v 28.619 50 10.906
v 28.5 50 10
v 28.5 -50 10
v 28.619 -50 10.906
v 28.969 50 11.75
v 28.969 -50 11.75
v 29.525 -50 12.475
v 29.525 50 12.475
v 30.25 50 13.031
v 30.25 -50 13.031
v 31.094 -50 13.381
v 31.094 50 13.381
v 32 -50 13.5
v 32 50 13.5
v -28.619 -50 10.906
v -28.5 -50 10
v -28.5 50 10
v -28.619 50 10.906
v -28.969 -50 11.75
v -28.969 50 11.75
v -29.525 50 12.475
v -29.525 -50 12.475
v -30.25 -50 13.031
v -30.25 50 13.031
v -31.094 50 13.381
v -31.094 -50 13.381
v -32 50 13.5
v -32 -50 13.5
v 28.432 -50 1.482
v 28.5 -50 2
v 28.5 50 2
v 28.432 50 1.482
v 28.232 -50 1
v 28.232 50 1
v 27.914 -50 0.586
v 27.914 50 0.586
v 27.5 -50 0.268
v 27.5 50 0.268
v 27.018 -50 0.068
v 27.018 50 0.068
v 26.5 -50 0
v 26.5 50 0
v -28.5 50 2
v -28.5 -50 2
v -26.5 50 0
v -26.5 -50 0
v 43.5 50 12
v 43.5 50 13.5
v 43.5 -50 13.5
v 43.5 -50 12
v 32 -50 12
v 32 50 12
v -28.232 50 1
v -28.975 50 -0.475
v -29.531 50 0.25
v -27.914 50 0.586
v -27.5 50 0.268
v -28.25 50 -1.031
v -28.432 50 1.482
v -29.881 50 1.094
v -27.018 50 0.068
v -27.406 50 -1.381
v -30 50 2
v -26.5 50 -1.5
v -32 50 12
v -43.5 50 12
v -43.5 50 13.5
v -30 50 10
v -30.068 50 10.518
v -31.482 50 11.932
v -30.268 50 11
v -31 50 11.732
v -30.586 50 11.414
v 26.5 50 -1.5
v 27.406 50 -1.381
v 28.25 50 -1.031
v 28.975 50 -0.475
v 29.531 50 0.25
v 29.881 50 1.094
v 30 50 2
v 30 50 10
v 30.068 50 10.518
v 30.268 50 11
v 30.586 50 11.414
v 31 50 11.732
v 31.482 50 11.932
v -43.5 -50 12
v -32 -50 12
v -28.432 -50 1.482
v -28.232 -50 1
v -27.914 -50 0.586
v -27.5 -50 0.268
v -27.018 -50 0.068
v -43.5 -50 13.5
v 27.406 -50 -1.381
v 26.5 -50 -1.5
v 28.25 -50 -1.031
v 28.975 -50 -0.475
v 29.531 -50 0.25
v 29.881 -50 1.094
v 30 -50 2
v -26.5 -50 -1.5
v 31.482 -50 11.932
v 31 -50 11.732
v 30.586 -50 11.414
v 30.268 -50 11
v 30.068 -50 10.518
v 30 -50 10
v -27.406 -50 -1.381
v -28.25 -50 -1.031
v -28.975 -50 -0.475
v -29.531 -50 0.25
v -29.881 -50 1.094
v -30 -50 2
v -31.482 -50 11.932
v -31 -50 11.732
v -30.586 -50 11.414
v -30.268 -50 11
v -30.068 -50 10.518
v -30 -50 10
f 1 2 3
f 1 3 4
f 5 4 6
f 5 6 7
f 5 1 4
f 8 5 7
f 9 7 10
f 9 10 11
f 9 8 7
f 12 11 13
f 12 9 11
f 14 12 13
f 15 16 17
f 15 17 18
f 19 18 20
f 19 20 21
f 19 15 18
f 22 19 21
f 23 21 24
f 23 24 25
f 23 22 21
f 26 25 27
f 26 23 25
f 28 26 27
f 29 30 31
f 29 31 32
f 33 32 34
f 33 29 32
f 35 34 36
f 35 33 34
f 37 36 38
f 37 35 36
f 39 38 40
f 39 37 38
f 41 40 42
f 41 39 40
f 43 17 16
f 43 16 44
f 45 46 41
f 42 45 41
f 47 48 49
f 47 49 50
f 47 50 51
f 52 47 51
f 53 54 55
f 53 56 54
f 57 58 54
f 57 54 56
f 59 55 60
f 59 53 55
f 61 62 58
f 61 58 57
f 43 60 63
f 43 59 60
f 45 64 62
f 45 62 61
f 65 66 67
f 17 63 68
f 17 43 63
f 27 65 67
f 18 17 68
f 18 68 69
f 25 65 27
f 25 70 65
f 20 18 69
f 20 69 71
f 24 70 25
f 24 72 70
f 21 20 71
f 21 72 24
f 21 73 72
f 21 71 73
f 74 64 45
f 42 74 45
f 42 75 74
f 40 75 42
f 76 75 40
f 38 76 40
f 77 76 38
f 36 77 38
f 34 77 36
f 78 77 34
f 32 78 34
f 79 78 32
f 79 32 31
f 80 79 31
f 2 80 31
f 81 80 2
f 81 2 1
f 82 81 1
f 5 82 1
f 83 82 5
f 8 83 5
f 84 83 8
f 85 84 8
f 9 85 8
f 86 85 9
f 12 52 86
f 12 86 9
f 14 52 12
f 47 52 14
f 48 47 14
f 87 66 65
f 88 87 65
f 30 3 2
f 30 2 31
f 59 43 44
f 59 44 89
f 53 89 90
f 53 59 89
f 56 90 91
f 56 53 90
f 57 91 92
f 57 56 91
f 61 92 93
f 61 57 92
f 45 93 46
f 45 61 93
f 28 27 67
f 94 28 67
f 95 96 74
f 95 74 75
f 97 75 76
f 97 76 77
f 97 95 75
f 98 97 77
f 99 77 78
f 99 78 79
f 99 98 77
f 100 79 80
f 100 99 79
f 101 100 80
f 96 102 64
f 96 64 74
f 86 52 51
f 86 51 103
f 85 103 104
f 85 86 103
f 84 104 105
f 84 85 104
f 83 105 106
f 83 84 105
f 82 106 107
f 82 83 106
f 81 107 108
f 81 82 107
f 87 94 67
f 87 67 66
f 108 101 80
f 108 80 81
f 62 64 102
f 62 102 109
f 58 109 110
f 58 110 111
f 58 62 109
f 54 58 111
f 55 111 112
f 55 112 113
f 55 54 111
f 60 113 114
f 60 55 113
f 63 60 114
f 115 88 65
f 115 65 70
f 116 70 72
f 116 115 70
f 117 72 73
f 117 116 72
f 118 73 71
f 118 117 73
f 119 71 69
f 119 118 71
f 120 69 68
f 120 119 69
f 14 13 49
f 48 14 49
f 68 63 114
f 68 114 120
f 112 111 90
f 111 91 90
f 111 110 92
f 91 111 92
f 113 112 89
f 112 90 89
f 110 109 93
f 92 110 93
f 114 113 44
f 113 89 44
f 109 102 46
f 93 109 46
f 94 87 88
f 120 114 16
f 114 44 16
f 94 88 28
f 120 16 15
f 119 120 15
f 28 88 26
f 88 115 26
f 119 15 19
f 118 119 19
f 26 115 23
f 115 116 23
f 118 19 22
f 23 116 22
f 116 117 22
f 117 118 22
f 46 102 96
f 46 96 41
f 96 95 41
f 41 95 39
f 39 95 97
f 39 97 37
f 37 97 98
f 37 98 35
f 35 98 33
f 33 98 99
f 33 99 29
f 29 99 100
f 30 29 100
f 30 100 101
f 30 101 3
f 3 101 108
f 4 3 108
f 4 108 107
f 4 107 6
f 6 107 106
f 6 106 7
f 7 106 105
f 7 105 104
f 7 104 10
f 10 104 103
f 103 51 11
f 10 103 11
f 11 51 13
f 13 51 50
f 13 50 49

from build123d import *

# Parameters (mm, degrees)
SKETCH_1_W                         = 60
SKETCH_1_H                         = 100
SM_BASE_FLANGE_1_DEPTH             = 1.5
SM_EDGE_FLANGE_1_STRIP_W           = 10
SM_EDGE_FLANGE_1_STRIP_H           = 1.5
SM_EDGE_FLANGE_1_STRIP_CUT_DEPTH   = 100
SM_EDGE_FLANGE_1_STRIP_2_W         = 10
SM_EDGE_FLANGE_1_STRIP_2_H         = 1.5
SM_EDGE_FLANGE_1_STRIP_CUT_2_DEPTH = 100
SM_EDGE_FLANGE_1_DEPTH             = 100
SM_EDGE_FLANGE_1_BEND_DEPTH        = 100
SM_EDGE_FLANGE_2_STRIP_W           = 10
SM_EDGE_FLANGE_2_STRIP_H           = 1.5
SM_EDGE_FLANGE_2_STRIP_CUT_DEPTH   = 100
SM_EDGE_FLANGE_2_STRIP_2_W         = 10
SM_EDGE_FLANGE_2_STRIP_2_H         = 1.5
SM_EDGE_FLANGE_2_STRIP_CUT_2_DEPTH = 100
SM_EDGE_FLANGE_2_DEPTH             = 100
SM_EDGE_FLANGE_2_BEND_DEPTH        = 100


# Sheet-metal steps are written as plain solids
with BuildPart() as part:
    # Sketch 1 → 基体-法兰1 (new body)
    with BuildSketch(Plane.XY):
        Rectangle(SKETCH_1_W, SKETCH_1_H)
    extrude(amount=-SM_BASE_FLANGE_1_DEPTH)

    # 边线-法兰1 strip (across the edge) → 边线-法兰1 strip cut (cut)
    with BuildSketch(Plane(origin=(-30, 50, 0), x_dir=(1, 0, 0), z_dir=(0, -1, 0))):
        with Locations((-1.5, -0.75)):
            Rectangle(SM_EDGE_FLANGE_1_STRIP_W, SM_EDGE_FLANGE_1_STRIP_H)
    extrude(amount=SM_EDGE_FLANGE_1_STRIP_CUT_DEPTH, mode=Mode.SUBTRACT)

    # 边线-法兰1 strip 2 (across the edge) → 边线-法兰1 strip cut 2 (cut)
    with BuildSketch(Plane(origin=(30, -50, 0), x_dir=(-1, 0, 0), z_dir=(0, 1, 0))):
        with Locations((-1.5, -0.75)):
            Rectangle(SM_EDGE_FLANGE_1_STRIP_2_W, SM_EDGE_FLANGE_1_STRIP_2_H)
    extrude(amount=SM_EDGE_FLANGE_1_STRIP_CUT_2_DEPTH, mode=Mode.SUBTRACT)

    # 边线-法兰1 section (across the edge) → 边线-法兰1 (add)
    with BuildSketch(Plane(origin=(-30, 50, 0), x_dir=(1, 0, 0), z_dir=(0, -1, 0))):
        with BuildLine():
            Line((0, 2), (0, 13.5))
            Line((0, 13.5), (1.5, 13.5))
            Line((1.5, 13.5), (1.5, 2))
            ThreePointArc((1.5, 2), (2.085786438, 0.585786438), (3.5, 0))
            Line((3.5, 0), (3.5, -1.5))
            ThreePointArc((3.5, -1.5), (1.025126266, -0.474873734), (0, 2))
        make_face()
    extrude(amount=SM_EDGE_FLANGE_1_DEPTH)

    # 边线-法兰1 section 2 (across the edge) → 边线-法兰1 bend (add)
    with BuildSketch(Plane(origin=(30, -50, 0), x_dir=(-1, 0, 0), z_dir=(0, 1, 0))):
        with BuildLine():
            Line((0, 2), (0, 13.5))
            Line((0, 13.5), (1.5, 13.5))
            Line((1.5, 13.5), (1.5, 2))
            ThreePointArc((1.5, 2), (2.085786438, 0.585786438), (3.5, 0))
            Line((3.5, 0), (3.5, -1.5))
            ThreePointArc((3.5, -1.5), (1.025126266, -0.474873734), (0, 2))
        make_face()
    extrude(amount=SM_EDGE_FLANGE_1_BEND_DEPTH)

    # 边线-法兰2 strip (across the edge) → 边线-法兰2 strip cut (cut)
    with BuildSketch(Plane(origin=(-30, -50, 13.5), x_dir=(0, 0, -1), z_dir=(0, 1, 0))):
        with Locations((-1.5, -0.75)):
            Rectangle(SM_EDGE_FLANGE_2_STRIP_W, SM_EDGE_FLANGE_2_STRIP_H)
    extrude(amount=SM_EDGE_FLANGE_2_STRIP_CUT_DEPTH, mode=Mode.SUBTRACT)

    # 边线-法兰2 strip 2 (across the edge) → 边线-法兰2 strip cut 2 (cut)
    with BuildSketch(Plane(origin=(30, 50, 13.5), x_dir=(0, 0, -1), z_dir=(0, -1, 0))):
        with Locations((-1.5, -0.75)):
            Rectangle(SM_EDGE_FLANGE_2_STRIP_2_W, SM_EDGE_FLANGE_2_STRIP_2_H)
    extrude(amount=SM_EDGE_FLANGE_2_STRIP_CUT_2_DEPTH, mode=Mode.SUBTRACT)

    # 边线-法兰2 section (across the edge) → 边线-法兰2 (add)
    with BuildSketch(Plane(origin=(-30, -50, 13.5), x_dir=(0, 0, -1), z_dir=(0, 1, 0))):
        with BuildLine():
            Line((0, 2), (0, 13.5))
            Line((0, 13.5), (1.5, 13.5))
            Line((1.5, 13.5), (1.5, 2))
            ThreePointArc((1.5, 2), (2.085786438, 0.585786438), (3.5, 0))
            Line((3.5, 0), (3.5, -1.5))
            ThreePointArc((3.5, -1.5), (1.025126266, -0.474873734), (0, 2))
        make_face()
    extrude(amount=SM_EDGE_FLANGE_2_DEPTH)

    # 边线-法兰2 section 2 (across the edge) → 边线-法兰2 bend (add)
    with BuildSketch(Plane(origin=(30, 50, 13.5), x_dir=(0, 0, -1), z_dir=(0, -1, 0))):
        with BuildLine():
            Line((0, 2), (0, 13.5))
            Line((0, 13.5), (1.5, 13.5))
            Line((1.5, 13.5), (1.5, 2))
            ThreePointArc((1.5, 2), (2.085786438, 0.585786438), (3.5, 0))
            Line((3.5, 0), (3.5, -1.5))
            ThreePointArc((3.5, -1.5), (1.025126266, -0.474873734), (0, 2))
        make_face()
    extrude(amount=SM_EDGE_FLANGE_2_BEND_DEPTH)


solid = part.part
